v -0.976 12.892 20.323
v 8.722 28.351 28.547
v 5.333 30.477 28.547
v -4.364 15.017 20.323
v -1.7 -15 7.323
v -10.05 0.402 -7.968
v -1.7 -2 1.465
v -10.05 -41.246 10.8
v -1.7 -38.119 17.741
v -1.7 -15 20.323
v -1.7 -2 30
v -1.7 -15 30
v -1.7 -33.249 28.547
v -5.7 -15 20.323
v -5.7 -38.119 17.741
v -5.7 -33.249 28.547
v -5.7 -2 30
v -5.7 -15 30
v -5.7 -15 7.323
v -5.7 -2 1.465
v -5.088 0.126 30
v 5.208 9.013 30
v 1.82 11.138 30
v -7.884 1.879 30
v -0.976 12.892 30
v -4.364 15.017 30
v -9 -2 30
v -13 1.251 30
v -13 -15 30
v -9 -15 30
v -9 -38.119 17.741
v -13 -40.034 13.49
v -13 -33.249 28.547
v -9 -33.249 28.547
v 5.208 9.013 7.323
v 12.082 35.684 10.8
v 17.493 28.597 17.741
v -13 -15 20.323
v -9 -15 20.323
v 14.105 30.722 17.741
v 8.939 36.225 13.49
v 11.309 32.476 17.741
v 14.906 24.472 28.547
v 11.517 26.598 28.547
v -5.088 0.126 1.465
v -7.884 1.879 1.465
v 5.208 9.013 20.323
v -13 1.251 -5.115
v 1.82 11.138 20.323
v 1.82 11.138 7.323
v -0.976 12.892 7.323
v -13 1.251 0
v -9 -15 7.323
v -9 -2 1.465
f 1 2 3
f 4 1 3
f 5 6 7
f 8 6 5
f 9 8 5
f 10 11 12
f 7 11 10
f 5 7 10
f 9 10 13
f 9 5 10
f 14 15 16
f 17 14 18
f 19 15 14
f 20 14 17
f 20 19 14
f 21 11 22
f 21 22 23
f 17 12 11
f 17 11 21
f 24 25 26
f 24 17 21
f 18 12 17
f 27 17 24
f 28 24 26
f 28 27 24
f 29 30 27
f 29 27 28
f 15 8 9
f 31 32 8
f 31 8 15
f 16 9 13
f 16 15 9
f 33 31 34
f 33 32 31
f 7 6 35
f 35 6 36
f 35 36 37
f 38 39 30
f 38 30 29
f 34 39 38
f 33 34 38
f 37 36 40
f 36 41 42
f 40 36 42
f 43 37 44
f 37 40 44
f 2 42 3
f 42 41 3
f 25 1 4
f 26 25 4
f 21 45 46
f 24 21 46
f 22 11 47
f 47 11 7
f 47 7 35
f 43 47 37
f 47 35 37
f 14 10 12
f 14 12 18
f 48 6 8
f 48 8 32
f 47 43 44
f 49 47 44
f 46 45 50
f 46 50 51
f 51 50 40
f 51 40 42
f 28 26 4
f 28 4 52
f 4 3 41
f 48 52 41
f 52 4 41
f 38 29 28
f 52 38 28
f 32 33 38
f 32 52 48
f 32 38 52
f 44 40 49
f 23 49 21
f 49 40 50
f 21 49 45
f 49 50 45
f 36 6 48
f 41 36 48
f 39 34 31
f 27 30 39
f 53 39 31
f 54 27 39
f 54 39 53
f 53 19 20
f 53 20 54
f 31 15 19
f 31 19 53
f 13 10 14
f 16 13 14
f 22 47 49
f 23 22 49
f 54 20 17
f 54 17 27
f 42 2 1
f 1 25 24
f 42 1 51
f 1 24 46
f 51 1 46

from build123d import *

# Parameters (mm, degrees)
BOSS_EXTRUDE3_DEPTH = 30
CUT_EXTRUDE1_DEPTH  = 36.393360959
SKETCH12_W          = 4
SKETCH12_H          = 13
BOSS_EXTRUDE4_DEPTH = 30
BOSS_EXTRUDE9_REACH = 63.617
CUT_EXTRUDE3_DEPTH  = 55.655521025
CUT_EXTRUDE4_REACH  = 52.517


with BuildPart() as part:
    # Sketch7 → Boss-Extrude3 (new body)
    with BuildSketch(Plane.XY):
        Polygon((-1.7, -2), (-1.7, -15), (-5.7, -15), (-5.7, -2), (-9, -2), (-9, -15), (-13, -15), (-13, 1.250897452), align=None)
    extrude(amount=BOSS_EXTRUDE3_DEPTH)

    # Sketch11 → Cut-Extrude1 (cut, through all)
    with BuildSketch(Plane.ZY.offset(13)):
        Polygon((0, 1.250897452), (7.323081285, -15), (0, -15), align=None)
    extrude(amount=-CUT_EXTRUDE1_DEPTH, mode=Mode.SUBTRACT)

    # Sketch12 → Boss-Extrude4 (add, along a direction that is not the sketch's normal)
    with BuildSketch(Plane(origin=(0, -15, 0), x_dir=(-1, 0, 0), z_dir=(0, -1, 0))):
        with Locations((11, -13.823081285)):
            Rectangle(SKETCH12_W, SKETCH12_H)
        with Locations((3.7, -13.823081285)):
            Rectangle(SKETCH12_W, SKETCH12_H)
    extrude(amount=BOSS_EXTRUDE4_DEPTH, dir=(0, -0.9117077113862475, 0.4108394443074459))

    # Boss-Extrude9: up to this plane
    boss_extrude9_end = Plane(origin=(-1.7, -2, 30), z_dir=(-0.27647610983397475, -0.9610207909775272, 0))
    # Sketch18 → Boss-Extrude9 (add, up to the surface)
    with BuildSketch(Plane(origin=(0, -42.351231342, 0), x_dir=(-1, 0, 0), z_dir=(0, -1, 0)), mode=Mode.PRIVATE) as boss_extrude9_sk1:
        Polygon((1.7, -19.648264614), (13, -19.648264614), (13, -8.348264614), align=None)
    boss_extrude9_tool1 = split(extrude(boss_extrude9_sk1.sketch, amount=BOSS_EXTRUDE9_REACH, dir=(0, 0.911707711386, -0.410839444307), mode=Mode.PRIVATE), bisect_by=boss_extrude9_end, keep=Keep.BOTH, mode=Mode.PRIVATE)
    add(boss_extrude9_tool1.solids().sort_by_distance((-9.233333, -42.351231, 15.881598))[0])

    # Sketch19 → Cut-Extrude3 (cut, through all)
    with BuildSketch(Plane.ZY.offset(13)):
        Polygon((8.348264614, -42.351231342), (28.546690724, -33.249289946), (32.648264614, -42.351231342), align=None)
    extrude(amount=-CUT_EXTRUDE3_DEPTH, mode=Mode.SUBTRACT)

    # Cut-Extrude4: up to this plane
    cut_extrude4_end = Plane(origin=(-1.7, -2, 30), z_dir=(-0.27647610983397475, -0.9610207909775272, 0))
    # Sketch20 → Cut-Extrude4 (cut, up to the surface)
    with BuildSketch(Plane(origin=(0, -38.329779101, 17.272405344), x_dir=(-1, 0, 0), z_dir=(0, -0.9117077113862475, 0.4108394443074459)), mode=Mode.PRIVATE) as cut_extrude4_sk1:
        Polygon((13, 9.788379124), (10.050437985, 7.09924069), (13, 4.149152479), align=None)
    cut_extrude4_tool1 = split(extrude(cut_extrude4_sk1.sketch, amount=-CUT_EXTRUDE4_REACH, mode=Mode.PRIVATE), bisect_by=cut_extrude4_end, keep=Keep.BOTH, mode=Mode.PRIVATE)
    add(cut_extrude4_tool1.solids().sort_by_distance((-12.016813, -41.210691, 10.879276))[0], mode=Mode.SUBTRACT)

    # Mirror3: part across plane


with BuildPart() as part_1:
    add(part.part)
    add(part.part.mirror(Plane(origin=(-1.7, -2, 30), x_dir=(0, 0, 1), z_dir=(-0.27647610983397475, -0.9610207909775272, 0))))


solid = part_1.part
